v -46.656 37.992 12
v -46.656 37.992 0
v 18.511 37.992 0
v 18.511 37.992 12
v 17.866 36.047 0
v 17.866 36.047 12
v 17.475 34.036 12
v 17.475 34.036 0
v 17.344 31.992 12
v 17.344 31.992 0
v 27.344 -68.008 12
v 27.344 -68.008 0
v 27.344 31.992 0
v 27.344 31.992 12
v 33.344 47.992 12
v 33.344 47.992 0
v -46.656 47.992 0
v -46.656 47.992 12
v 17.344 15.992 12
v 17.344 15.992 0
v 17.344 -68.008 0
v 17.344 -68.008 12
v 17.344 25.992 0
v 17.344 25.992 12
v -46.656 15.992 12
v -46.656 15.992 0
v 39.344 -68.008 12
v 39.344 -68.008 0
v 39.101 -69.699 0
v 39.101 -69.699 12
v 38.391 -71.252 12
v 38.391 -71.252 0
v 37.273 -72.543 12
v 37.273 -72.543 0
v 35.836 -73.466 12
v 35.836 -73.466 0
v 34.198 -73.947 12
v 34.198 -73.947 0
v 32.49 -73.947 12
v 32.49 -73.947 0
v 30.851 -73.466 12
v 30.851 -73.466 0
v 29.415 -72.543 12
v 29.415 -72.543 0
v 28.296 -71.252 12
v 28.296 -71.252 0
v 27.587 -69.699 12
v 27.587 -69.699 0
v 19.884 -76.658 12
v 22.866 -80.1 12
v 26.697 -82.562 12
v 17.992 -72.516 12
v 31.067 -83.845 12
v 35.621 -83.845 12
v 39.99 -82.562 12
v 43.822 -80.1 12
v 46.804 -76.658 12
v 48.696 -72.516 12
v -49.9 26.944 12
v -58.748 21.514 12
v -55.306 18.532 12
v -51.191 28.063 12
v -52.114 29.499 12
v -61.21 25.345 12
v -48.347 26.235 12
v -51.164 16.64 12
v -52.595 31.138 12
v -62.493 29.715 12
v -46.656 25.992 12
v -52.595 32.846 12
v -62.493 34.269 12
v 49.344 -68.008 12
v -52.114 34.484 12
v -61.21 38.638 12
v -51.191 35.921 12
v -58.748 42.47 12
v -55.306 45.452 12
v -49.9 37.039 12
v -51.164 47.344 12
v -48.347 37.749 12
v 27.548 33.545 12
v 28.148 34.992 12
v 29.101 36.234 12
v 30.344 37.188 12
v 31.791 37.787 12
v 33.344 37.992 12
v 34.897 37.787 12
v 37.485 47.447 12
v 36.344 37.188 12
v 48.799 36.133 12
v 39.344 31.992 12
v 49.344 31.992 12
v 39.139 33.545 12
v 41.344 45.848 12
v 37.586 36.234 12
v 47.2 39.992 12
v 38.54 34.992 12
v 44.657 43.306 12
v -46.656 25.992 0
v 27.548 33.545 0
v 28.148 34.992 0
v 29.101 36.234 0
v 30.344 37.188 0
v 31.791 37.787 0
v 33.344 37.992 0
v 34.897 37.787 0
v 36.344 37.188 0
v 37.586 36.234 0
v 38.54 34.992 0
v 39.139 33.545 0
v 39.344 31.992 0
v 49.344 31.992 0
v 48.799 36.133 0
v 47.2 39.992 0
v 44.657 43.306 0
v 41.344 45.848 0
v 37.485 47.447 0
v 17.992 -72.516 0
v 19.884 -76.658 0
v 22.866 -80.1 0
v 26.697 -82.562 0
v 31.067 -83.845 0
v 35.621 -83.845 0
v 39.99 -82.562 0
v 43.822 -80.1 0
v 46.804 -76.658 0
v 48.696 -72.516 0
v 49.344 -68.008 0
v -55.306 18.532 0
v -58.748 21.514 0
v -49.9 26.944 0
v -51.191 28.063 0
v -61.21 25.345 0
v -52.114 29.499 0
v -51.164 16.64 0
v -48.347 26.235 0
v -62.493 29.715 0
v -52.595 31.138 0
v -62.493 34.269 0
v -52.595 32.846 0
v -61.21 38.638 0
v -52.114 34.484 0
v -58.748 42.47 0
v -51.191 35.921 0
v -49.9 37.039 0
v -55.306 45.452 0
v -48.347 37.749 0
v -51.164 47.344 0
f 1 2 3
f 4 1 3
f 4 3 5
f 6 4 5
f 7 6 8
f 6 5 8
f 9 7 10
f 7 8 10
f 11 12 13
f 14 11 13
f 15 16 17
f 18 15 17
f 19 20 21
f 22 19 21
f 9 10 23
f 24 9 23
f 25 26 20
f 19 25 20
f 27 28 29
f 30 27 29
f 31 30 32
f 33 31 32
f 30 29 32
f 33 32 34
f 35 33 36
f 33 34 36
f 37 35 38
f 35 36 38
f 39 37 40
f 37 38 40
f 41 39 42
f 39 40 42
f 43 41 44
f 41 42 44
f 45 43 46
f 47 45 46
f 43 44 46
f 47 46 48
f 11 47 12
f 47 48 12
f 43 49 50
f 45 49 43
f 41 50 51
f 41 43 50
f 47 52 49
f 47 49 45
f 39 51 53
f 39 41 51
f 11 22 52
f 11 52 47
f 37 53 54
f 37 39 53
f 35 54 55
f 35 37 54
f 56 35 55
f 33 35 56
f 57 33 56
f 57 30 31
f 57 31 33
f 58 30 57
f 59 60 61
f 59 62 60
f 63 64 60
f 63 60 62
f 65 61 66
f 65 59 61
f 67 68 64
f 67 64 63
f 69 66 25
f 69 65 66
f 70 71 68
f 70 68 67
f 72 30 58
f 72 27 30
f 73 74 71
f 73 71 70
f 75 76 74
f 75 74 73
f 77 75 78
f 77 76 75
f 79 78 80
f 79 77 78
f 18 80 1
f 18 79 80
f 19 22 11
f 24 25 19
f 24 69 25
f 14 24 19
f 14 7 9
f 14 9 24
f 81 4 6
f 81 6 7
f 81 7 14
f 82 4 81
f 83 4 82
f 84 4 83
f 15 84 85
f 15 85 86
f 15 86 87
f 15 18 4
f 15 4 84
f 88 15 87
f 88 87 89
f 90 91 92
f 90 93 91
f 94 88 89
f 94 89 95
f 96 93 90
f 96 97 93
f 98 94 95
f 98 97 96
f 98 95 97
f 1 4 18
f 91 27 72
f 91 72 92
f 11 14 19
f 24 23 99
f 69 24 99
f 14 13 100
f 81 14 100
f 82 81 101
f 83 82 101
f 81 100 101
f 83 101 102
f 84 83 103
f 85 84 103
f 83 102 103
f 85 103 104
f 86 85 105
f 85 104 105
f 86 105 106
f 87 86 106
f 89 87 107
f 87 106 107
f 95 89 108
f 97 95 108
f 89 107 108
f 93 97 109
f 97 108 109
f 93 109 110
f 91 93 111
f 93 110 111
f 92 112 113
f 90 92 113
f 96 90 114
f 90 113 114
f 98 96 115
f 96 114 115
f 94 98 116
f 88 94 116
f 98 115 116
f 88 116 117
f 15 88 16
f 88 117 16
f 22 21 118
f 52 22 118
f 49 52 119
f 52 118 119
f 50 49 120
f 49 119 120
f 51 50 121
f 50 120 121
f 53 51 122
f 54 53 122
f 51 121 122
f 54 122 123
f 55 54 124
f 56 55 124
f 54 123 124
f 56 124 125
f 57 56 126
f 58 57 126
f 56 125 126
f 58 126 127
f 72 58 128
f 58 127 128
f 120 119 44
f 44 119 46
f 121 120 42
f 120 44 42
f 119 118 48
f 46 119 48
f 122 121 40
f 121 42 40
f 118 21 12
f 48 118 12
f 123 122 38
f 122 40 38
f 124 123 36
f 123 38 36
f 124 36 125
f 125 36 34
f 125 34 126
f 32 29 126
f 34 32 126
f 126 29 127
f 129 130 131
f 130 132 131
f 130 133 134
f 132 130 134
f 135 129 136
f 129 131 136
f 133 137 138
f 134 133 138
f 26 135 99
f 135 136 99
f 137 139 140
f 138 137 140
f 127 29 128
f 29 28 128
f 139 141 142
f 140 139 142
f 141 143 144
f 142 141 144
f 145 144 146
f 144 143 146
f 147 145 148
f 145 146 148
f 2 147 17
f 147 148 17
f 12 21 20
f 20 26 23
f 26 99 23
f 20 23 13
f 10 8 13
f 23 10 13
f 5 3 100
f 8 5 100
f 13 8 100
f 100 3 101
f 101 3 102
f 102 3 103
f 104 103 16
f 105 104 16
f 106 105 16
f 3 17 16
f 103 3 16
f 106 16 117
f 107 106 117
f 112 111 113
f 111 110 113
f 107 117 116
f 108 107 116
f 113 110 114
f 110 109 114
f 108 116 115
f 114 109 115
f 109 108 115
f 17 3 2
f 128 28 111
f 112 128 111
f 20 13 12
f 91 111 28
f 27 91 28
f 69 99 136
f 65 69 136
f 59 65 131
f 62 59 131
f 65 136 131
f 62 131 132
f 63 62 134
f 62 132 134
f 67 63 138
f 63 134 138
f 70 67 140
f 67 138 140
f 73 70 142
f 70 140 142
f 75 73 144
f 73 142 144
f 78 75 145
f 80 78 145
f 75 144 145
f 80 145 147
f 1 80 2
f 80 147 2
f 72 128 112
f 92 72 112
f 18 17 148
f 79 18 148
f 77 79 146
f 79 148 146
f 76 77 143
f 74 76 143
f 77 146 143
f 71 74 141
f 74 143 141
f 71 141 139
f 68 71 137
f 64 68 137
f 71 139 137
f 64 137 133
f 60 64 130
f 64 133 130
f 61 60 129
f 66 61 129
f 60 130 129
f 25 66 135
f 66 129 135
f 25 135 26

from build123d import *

# Parameters (mm, degrees)
F0_W     = 10
F0_H     = 10
F1_DEPTH = 12


# Not quite as in the source:
# - ends of sketch curves that miss each other by under 0.0002 mm in the source are joined


with BuildPart() as f1:
    # F0 (on Top) → F1 (new body)
    with BuildSketch(Plane.XY):
        with BuildLine():
            ThreePointArc((49.3437788486, 31.9918581452), (44.6574873088, 43.3055665732), (33.3437788486, 47.9918580353))
            ThreePointArc((33.3437788486, 47.9918580353), (24.3995068895, 45.2583572735), (18.51138183, 37.9918580353))
            Line((18.51138183, 37.9918580353), (33.3437788486, 37.9918580353))
            ThreePointArc((33.3437788486, 37.9918580353), (37.5864194969, 36.2344987613), (39.3437788486, 31.9918581452))
            Line((39.3437788486, 31.9918581452), (39.3437788486, 17.1594610611))
            ThreePointArc((39.3437788486, 17.1594610611), (46.6102780408, 23.0475861709), (49.3437788486, 31.9918581452))
        make_face()
        with BuildLine():
            Line((49.3437788486, -68.0081418548), (49.3437788486, 31.9918581452))
            ThreePointArc((49.3437788486, 31.9918581452), (46.6102780408, 23.0475861709), (39.3437788486, 17.1594610611))
            Line((39.3437788486, 17.1594610611), (39.3437788486, -68.0081418548))
            ThreePointArc((39.3437788486, -68.0081418548), (33.3437788486, -74.0081418548), (27.3437788486, -68.0081418548))
            Line((27.3437788486, -68.0081418548), (27.3437788486, 15.9918580353))
            Line((27.3437788486, 15.9918580353), (17.3437788486, 15.9918580353))
            Line((17.3437788486, 15.9918580353), (17.3437788486, -68.0081418548))
            ThreePointArc((17.3437788486, -68.0081418548), (33.3437788486, -84.0081418548), (49.3437788486, -68.0081418548))
        make_face()
        with BuildLine():
            Line((33.3437788486, 37.9918580353), (18.51138183, 37.9918580353))
            ThreePointArc((18.51138183, 37.9918580353), (17.6383919973, 35.0481342863), (17.3437788486, 31.9918581452))
            Line((17.3437788486, 31.9918581452), (17.3437788486, 25.9918580353))
            Line((17.3437788486, 25.9918580353), (27.3437788486, 25.9918580353))
            Line((27.3437788486, 25.9918580353), (27.3437788486, 31.9918581452))
            ThreePointArc((27.3437788486, 31.9918581452), (29.1011381615, 36.2344988323), (33.3437788486, 37.9918580353))
        make_face()
        with Locations((22.3437788486, 20.9918580353)):
            Rectangle(F0_W, F0_H)
        with BuildLine():
            Line((33.3437788486, 47.9918580353), (-46.6562211514, 47.9918580353))
            ThreePointArc((-46.6562211514, 47.9918580353), (-62.6562211514, 31.9918580353), (-46.6562211514, 15.9918580353))
            Line((-46.6562211514, 15.9918580353), (17.3437788486, 15.9918580353))
            Line((17.3437788486, 15.9918580353), (17.3437788486, 25.9918580353))
            Line((17.3437788486, 25.9918580353), (-46.6562211514, 25.9918580353))
            ThreePointArc((-46.6562211514, 25.9918580353), (-52.6562211514, 31.9918580353), (-46.6562211514, 37.9918580353))
            Line((-46.6562211514, 37.9918580353), (18.51138183, 37.9918580353))
            ThreePointArc((18.51138183, 37.9918580353), (24.3995068895, 45.2583572735), (33.3437788486, 47.9918580353))
        make_face()
    extrude(amount=F1_DEPTH)


solid = f1.part
